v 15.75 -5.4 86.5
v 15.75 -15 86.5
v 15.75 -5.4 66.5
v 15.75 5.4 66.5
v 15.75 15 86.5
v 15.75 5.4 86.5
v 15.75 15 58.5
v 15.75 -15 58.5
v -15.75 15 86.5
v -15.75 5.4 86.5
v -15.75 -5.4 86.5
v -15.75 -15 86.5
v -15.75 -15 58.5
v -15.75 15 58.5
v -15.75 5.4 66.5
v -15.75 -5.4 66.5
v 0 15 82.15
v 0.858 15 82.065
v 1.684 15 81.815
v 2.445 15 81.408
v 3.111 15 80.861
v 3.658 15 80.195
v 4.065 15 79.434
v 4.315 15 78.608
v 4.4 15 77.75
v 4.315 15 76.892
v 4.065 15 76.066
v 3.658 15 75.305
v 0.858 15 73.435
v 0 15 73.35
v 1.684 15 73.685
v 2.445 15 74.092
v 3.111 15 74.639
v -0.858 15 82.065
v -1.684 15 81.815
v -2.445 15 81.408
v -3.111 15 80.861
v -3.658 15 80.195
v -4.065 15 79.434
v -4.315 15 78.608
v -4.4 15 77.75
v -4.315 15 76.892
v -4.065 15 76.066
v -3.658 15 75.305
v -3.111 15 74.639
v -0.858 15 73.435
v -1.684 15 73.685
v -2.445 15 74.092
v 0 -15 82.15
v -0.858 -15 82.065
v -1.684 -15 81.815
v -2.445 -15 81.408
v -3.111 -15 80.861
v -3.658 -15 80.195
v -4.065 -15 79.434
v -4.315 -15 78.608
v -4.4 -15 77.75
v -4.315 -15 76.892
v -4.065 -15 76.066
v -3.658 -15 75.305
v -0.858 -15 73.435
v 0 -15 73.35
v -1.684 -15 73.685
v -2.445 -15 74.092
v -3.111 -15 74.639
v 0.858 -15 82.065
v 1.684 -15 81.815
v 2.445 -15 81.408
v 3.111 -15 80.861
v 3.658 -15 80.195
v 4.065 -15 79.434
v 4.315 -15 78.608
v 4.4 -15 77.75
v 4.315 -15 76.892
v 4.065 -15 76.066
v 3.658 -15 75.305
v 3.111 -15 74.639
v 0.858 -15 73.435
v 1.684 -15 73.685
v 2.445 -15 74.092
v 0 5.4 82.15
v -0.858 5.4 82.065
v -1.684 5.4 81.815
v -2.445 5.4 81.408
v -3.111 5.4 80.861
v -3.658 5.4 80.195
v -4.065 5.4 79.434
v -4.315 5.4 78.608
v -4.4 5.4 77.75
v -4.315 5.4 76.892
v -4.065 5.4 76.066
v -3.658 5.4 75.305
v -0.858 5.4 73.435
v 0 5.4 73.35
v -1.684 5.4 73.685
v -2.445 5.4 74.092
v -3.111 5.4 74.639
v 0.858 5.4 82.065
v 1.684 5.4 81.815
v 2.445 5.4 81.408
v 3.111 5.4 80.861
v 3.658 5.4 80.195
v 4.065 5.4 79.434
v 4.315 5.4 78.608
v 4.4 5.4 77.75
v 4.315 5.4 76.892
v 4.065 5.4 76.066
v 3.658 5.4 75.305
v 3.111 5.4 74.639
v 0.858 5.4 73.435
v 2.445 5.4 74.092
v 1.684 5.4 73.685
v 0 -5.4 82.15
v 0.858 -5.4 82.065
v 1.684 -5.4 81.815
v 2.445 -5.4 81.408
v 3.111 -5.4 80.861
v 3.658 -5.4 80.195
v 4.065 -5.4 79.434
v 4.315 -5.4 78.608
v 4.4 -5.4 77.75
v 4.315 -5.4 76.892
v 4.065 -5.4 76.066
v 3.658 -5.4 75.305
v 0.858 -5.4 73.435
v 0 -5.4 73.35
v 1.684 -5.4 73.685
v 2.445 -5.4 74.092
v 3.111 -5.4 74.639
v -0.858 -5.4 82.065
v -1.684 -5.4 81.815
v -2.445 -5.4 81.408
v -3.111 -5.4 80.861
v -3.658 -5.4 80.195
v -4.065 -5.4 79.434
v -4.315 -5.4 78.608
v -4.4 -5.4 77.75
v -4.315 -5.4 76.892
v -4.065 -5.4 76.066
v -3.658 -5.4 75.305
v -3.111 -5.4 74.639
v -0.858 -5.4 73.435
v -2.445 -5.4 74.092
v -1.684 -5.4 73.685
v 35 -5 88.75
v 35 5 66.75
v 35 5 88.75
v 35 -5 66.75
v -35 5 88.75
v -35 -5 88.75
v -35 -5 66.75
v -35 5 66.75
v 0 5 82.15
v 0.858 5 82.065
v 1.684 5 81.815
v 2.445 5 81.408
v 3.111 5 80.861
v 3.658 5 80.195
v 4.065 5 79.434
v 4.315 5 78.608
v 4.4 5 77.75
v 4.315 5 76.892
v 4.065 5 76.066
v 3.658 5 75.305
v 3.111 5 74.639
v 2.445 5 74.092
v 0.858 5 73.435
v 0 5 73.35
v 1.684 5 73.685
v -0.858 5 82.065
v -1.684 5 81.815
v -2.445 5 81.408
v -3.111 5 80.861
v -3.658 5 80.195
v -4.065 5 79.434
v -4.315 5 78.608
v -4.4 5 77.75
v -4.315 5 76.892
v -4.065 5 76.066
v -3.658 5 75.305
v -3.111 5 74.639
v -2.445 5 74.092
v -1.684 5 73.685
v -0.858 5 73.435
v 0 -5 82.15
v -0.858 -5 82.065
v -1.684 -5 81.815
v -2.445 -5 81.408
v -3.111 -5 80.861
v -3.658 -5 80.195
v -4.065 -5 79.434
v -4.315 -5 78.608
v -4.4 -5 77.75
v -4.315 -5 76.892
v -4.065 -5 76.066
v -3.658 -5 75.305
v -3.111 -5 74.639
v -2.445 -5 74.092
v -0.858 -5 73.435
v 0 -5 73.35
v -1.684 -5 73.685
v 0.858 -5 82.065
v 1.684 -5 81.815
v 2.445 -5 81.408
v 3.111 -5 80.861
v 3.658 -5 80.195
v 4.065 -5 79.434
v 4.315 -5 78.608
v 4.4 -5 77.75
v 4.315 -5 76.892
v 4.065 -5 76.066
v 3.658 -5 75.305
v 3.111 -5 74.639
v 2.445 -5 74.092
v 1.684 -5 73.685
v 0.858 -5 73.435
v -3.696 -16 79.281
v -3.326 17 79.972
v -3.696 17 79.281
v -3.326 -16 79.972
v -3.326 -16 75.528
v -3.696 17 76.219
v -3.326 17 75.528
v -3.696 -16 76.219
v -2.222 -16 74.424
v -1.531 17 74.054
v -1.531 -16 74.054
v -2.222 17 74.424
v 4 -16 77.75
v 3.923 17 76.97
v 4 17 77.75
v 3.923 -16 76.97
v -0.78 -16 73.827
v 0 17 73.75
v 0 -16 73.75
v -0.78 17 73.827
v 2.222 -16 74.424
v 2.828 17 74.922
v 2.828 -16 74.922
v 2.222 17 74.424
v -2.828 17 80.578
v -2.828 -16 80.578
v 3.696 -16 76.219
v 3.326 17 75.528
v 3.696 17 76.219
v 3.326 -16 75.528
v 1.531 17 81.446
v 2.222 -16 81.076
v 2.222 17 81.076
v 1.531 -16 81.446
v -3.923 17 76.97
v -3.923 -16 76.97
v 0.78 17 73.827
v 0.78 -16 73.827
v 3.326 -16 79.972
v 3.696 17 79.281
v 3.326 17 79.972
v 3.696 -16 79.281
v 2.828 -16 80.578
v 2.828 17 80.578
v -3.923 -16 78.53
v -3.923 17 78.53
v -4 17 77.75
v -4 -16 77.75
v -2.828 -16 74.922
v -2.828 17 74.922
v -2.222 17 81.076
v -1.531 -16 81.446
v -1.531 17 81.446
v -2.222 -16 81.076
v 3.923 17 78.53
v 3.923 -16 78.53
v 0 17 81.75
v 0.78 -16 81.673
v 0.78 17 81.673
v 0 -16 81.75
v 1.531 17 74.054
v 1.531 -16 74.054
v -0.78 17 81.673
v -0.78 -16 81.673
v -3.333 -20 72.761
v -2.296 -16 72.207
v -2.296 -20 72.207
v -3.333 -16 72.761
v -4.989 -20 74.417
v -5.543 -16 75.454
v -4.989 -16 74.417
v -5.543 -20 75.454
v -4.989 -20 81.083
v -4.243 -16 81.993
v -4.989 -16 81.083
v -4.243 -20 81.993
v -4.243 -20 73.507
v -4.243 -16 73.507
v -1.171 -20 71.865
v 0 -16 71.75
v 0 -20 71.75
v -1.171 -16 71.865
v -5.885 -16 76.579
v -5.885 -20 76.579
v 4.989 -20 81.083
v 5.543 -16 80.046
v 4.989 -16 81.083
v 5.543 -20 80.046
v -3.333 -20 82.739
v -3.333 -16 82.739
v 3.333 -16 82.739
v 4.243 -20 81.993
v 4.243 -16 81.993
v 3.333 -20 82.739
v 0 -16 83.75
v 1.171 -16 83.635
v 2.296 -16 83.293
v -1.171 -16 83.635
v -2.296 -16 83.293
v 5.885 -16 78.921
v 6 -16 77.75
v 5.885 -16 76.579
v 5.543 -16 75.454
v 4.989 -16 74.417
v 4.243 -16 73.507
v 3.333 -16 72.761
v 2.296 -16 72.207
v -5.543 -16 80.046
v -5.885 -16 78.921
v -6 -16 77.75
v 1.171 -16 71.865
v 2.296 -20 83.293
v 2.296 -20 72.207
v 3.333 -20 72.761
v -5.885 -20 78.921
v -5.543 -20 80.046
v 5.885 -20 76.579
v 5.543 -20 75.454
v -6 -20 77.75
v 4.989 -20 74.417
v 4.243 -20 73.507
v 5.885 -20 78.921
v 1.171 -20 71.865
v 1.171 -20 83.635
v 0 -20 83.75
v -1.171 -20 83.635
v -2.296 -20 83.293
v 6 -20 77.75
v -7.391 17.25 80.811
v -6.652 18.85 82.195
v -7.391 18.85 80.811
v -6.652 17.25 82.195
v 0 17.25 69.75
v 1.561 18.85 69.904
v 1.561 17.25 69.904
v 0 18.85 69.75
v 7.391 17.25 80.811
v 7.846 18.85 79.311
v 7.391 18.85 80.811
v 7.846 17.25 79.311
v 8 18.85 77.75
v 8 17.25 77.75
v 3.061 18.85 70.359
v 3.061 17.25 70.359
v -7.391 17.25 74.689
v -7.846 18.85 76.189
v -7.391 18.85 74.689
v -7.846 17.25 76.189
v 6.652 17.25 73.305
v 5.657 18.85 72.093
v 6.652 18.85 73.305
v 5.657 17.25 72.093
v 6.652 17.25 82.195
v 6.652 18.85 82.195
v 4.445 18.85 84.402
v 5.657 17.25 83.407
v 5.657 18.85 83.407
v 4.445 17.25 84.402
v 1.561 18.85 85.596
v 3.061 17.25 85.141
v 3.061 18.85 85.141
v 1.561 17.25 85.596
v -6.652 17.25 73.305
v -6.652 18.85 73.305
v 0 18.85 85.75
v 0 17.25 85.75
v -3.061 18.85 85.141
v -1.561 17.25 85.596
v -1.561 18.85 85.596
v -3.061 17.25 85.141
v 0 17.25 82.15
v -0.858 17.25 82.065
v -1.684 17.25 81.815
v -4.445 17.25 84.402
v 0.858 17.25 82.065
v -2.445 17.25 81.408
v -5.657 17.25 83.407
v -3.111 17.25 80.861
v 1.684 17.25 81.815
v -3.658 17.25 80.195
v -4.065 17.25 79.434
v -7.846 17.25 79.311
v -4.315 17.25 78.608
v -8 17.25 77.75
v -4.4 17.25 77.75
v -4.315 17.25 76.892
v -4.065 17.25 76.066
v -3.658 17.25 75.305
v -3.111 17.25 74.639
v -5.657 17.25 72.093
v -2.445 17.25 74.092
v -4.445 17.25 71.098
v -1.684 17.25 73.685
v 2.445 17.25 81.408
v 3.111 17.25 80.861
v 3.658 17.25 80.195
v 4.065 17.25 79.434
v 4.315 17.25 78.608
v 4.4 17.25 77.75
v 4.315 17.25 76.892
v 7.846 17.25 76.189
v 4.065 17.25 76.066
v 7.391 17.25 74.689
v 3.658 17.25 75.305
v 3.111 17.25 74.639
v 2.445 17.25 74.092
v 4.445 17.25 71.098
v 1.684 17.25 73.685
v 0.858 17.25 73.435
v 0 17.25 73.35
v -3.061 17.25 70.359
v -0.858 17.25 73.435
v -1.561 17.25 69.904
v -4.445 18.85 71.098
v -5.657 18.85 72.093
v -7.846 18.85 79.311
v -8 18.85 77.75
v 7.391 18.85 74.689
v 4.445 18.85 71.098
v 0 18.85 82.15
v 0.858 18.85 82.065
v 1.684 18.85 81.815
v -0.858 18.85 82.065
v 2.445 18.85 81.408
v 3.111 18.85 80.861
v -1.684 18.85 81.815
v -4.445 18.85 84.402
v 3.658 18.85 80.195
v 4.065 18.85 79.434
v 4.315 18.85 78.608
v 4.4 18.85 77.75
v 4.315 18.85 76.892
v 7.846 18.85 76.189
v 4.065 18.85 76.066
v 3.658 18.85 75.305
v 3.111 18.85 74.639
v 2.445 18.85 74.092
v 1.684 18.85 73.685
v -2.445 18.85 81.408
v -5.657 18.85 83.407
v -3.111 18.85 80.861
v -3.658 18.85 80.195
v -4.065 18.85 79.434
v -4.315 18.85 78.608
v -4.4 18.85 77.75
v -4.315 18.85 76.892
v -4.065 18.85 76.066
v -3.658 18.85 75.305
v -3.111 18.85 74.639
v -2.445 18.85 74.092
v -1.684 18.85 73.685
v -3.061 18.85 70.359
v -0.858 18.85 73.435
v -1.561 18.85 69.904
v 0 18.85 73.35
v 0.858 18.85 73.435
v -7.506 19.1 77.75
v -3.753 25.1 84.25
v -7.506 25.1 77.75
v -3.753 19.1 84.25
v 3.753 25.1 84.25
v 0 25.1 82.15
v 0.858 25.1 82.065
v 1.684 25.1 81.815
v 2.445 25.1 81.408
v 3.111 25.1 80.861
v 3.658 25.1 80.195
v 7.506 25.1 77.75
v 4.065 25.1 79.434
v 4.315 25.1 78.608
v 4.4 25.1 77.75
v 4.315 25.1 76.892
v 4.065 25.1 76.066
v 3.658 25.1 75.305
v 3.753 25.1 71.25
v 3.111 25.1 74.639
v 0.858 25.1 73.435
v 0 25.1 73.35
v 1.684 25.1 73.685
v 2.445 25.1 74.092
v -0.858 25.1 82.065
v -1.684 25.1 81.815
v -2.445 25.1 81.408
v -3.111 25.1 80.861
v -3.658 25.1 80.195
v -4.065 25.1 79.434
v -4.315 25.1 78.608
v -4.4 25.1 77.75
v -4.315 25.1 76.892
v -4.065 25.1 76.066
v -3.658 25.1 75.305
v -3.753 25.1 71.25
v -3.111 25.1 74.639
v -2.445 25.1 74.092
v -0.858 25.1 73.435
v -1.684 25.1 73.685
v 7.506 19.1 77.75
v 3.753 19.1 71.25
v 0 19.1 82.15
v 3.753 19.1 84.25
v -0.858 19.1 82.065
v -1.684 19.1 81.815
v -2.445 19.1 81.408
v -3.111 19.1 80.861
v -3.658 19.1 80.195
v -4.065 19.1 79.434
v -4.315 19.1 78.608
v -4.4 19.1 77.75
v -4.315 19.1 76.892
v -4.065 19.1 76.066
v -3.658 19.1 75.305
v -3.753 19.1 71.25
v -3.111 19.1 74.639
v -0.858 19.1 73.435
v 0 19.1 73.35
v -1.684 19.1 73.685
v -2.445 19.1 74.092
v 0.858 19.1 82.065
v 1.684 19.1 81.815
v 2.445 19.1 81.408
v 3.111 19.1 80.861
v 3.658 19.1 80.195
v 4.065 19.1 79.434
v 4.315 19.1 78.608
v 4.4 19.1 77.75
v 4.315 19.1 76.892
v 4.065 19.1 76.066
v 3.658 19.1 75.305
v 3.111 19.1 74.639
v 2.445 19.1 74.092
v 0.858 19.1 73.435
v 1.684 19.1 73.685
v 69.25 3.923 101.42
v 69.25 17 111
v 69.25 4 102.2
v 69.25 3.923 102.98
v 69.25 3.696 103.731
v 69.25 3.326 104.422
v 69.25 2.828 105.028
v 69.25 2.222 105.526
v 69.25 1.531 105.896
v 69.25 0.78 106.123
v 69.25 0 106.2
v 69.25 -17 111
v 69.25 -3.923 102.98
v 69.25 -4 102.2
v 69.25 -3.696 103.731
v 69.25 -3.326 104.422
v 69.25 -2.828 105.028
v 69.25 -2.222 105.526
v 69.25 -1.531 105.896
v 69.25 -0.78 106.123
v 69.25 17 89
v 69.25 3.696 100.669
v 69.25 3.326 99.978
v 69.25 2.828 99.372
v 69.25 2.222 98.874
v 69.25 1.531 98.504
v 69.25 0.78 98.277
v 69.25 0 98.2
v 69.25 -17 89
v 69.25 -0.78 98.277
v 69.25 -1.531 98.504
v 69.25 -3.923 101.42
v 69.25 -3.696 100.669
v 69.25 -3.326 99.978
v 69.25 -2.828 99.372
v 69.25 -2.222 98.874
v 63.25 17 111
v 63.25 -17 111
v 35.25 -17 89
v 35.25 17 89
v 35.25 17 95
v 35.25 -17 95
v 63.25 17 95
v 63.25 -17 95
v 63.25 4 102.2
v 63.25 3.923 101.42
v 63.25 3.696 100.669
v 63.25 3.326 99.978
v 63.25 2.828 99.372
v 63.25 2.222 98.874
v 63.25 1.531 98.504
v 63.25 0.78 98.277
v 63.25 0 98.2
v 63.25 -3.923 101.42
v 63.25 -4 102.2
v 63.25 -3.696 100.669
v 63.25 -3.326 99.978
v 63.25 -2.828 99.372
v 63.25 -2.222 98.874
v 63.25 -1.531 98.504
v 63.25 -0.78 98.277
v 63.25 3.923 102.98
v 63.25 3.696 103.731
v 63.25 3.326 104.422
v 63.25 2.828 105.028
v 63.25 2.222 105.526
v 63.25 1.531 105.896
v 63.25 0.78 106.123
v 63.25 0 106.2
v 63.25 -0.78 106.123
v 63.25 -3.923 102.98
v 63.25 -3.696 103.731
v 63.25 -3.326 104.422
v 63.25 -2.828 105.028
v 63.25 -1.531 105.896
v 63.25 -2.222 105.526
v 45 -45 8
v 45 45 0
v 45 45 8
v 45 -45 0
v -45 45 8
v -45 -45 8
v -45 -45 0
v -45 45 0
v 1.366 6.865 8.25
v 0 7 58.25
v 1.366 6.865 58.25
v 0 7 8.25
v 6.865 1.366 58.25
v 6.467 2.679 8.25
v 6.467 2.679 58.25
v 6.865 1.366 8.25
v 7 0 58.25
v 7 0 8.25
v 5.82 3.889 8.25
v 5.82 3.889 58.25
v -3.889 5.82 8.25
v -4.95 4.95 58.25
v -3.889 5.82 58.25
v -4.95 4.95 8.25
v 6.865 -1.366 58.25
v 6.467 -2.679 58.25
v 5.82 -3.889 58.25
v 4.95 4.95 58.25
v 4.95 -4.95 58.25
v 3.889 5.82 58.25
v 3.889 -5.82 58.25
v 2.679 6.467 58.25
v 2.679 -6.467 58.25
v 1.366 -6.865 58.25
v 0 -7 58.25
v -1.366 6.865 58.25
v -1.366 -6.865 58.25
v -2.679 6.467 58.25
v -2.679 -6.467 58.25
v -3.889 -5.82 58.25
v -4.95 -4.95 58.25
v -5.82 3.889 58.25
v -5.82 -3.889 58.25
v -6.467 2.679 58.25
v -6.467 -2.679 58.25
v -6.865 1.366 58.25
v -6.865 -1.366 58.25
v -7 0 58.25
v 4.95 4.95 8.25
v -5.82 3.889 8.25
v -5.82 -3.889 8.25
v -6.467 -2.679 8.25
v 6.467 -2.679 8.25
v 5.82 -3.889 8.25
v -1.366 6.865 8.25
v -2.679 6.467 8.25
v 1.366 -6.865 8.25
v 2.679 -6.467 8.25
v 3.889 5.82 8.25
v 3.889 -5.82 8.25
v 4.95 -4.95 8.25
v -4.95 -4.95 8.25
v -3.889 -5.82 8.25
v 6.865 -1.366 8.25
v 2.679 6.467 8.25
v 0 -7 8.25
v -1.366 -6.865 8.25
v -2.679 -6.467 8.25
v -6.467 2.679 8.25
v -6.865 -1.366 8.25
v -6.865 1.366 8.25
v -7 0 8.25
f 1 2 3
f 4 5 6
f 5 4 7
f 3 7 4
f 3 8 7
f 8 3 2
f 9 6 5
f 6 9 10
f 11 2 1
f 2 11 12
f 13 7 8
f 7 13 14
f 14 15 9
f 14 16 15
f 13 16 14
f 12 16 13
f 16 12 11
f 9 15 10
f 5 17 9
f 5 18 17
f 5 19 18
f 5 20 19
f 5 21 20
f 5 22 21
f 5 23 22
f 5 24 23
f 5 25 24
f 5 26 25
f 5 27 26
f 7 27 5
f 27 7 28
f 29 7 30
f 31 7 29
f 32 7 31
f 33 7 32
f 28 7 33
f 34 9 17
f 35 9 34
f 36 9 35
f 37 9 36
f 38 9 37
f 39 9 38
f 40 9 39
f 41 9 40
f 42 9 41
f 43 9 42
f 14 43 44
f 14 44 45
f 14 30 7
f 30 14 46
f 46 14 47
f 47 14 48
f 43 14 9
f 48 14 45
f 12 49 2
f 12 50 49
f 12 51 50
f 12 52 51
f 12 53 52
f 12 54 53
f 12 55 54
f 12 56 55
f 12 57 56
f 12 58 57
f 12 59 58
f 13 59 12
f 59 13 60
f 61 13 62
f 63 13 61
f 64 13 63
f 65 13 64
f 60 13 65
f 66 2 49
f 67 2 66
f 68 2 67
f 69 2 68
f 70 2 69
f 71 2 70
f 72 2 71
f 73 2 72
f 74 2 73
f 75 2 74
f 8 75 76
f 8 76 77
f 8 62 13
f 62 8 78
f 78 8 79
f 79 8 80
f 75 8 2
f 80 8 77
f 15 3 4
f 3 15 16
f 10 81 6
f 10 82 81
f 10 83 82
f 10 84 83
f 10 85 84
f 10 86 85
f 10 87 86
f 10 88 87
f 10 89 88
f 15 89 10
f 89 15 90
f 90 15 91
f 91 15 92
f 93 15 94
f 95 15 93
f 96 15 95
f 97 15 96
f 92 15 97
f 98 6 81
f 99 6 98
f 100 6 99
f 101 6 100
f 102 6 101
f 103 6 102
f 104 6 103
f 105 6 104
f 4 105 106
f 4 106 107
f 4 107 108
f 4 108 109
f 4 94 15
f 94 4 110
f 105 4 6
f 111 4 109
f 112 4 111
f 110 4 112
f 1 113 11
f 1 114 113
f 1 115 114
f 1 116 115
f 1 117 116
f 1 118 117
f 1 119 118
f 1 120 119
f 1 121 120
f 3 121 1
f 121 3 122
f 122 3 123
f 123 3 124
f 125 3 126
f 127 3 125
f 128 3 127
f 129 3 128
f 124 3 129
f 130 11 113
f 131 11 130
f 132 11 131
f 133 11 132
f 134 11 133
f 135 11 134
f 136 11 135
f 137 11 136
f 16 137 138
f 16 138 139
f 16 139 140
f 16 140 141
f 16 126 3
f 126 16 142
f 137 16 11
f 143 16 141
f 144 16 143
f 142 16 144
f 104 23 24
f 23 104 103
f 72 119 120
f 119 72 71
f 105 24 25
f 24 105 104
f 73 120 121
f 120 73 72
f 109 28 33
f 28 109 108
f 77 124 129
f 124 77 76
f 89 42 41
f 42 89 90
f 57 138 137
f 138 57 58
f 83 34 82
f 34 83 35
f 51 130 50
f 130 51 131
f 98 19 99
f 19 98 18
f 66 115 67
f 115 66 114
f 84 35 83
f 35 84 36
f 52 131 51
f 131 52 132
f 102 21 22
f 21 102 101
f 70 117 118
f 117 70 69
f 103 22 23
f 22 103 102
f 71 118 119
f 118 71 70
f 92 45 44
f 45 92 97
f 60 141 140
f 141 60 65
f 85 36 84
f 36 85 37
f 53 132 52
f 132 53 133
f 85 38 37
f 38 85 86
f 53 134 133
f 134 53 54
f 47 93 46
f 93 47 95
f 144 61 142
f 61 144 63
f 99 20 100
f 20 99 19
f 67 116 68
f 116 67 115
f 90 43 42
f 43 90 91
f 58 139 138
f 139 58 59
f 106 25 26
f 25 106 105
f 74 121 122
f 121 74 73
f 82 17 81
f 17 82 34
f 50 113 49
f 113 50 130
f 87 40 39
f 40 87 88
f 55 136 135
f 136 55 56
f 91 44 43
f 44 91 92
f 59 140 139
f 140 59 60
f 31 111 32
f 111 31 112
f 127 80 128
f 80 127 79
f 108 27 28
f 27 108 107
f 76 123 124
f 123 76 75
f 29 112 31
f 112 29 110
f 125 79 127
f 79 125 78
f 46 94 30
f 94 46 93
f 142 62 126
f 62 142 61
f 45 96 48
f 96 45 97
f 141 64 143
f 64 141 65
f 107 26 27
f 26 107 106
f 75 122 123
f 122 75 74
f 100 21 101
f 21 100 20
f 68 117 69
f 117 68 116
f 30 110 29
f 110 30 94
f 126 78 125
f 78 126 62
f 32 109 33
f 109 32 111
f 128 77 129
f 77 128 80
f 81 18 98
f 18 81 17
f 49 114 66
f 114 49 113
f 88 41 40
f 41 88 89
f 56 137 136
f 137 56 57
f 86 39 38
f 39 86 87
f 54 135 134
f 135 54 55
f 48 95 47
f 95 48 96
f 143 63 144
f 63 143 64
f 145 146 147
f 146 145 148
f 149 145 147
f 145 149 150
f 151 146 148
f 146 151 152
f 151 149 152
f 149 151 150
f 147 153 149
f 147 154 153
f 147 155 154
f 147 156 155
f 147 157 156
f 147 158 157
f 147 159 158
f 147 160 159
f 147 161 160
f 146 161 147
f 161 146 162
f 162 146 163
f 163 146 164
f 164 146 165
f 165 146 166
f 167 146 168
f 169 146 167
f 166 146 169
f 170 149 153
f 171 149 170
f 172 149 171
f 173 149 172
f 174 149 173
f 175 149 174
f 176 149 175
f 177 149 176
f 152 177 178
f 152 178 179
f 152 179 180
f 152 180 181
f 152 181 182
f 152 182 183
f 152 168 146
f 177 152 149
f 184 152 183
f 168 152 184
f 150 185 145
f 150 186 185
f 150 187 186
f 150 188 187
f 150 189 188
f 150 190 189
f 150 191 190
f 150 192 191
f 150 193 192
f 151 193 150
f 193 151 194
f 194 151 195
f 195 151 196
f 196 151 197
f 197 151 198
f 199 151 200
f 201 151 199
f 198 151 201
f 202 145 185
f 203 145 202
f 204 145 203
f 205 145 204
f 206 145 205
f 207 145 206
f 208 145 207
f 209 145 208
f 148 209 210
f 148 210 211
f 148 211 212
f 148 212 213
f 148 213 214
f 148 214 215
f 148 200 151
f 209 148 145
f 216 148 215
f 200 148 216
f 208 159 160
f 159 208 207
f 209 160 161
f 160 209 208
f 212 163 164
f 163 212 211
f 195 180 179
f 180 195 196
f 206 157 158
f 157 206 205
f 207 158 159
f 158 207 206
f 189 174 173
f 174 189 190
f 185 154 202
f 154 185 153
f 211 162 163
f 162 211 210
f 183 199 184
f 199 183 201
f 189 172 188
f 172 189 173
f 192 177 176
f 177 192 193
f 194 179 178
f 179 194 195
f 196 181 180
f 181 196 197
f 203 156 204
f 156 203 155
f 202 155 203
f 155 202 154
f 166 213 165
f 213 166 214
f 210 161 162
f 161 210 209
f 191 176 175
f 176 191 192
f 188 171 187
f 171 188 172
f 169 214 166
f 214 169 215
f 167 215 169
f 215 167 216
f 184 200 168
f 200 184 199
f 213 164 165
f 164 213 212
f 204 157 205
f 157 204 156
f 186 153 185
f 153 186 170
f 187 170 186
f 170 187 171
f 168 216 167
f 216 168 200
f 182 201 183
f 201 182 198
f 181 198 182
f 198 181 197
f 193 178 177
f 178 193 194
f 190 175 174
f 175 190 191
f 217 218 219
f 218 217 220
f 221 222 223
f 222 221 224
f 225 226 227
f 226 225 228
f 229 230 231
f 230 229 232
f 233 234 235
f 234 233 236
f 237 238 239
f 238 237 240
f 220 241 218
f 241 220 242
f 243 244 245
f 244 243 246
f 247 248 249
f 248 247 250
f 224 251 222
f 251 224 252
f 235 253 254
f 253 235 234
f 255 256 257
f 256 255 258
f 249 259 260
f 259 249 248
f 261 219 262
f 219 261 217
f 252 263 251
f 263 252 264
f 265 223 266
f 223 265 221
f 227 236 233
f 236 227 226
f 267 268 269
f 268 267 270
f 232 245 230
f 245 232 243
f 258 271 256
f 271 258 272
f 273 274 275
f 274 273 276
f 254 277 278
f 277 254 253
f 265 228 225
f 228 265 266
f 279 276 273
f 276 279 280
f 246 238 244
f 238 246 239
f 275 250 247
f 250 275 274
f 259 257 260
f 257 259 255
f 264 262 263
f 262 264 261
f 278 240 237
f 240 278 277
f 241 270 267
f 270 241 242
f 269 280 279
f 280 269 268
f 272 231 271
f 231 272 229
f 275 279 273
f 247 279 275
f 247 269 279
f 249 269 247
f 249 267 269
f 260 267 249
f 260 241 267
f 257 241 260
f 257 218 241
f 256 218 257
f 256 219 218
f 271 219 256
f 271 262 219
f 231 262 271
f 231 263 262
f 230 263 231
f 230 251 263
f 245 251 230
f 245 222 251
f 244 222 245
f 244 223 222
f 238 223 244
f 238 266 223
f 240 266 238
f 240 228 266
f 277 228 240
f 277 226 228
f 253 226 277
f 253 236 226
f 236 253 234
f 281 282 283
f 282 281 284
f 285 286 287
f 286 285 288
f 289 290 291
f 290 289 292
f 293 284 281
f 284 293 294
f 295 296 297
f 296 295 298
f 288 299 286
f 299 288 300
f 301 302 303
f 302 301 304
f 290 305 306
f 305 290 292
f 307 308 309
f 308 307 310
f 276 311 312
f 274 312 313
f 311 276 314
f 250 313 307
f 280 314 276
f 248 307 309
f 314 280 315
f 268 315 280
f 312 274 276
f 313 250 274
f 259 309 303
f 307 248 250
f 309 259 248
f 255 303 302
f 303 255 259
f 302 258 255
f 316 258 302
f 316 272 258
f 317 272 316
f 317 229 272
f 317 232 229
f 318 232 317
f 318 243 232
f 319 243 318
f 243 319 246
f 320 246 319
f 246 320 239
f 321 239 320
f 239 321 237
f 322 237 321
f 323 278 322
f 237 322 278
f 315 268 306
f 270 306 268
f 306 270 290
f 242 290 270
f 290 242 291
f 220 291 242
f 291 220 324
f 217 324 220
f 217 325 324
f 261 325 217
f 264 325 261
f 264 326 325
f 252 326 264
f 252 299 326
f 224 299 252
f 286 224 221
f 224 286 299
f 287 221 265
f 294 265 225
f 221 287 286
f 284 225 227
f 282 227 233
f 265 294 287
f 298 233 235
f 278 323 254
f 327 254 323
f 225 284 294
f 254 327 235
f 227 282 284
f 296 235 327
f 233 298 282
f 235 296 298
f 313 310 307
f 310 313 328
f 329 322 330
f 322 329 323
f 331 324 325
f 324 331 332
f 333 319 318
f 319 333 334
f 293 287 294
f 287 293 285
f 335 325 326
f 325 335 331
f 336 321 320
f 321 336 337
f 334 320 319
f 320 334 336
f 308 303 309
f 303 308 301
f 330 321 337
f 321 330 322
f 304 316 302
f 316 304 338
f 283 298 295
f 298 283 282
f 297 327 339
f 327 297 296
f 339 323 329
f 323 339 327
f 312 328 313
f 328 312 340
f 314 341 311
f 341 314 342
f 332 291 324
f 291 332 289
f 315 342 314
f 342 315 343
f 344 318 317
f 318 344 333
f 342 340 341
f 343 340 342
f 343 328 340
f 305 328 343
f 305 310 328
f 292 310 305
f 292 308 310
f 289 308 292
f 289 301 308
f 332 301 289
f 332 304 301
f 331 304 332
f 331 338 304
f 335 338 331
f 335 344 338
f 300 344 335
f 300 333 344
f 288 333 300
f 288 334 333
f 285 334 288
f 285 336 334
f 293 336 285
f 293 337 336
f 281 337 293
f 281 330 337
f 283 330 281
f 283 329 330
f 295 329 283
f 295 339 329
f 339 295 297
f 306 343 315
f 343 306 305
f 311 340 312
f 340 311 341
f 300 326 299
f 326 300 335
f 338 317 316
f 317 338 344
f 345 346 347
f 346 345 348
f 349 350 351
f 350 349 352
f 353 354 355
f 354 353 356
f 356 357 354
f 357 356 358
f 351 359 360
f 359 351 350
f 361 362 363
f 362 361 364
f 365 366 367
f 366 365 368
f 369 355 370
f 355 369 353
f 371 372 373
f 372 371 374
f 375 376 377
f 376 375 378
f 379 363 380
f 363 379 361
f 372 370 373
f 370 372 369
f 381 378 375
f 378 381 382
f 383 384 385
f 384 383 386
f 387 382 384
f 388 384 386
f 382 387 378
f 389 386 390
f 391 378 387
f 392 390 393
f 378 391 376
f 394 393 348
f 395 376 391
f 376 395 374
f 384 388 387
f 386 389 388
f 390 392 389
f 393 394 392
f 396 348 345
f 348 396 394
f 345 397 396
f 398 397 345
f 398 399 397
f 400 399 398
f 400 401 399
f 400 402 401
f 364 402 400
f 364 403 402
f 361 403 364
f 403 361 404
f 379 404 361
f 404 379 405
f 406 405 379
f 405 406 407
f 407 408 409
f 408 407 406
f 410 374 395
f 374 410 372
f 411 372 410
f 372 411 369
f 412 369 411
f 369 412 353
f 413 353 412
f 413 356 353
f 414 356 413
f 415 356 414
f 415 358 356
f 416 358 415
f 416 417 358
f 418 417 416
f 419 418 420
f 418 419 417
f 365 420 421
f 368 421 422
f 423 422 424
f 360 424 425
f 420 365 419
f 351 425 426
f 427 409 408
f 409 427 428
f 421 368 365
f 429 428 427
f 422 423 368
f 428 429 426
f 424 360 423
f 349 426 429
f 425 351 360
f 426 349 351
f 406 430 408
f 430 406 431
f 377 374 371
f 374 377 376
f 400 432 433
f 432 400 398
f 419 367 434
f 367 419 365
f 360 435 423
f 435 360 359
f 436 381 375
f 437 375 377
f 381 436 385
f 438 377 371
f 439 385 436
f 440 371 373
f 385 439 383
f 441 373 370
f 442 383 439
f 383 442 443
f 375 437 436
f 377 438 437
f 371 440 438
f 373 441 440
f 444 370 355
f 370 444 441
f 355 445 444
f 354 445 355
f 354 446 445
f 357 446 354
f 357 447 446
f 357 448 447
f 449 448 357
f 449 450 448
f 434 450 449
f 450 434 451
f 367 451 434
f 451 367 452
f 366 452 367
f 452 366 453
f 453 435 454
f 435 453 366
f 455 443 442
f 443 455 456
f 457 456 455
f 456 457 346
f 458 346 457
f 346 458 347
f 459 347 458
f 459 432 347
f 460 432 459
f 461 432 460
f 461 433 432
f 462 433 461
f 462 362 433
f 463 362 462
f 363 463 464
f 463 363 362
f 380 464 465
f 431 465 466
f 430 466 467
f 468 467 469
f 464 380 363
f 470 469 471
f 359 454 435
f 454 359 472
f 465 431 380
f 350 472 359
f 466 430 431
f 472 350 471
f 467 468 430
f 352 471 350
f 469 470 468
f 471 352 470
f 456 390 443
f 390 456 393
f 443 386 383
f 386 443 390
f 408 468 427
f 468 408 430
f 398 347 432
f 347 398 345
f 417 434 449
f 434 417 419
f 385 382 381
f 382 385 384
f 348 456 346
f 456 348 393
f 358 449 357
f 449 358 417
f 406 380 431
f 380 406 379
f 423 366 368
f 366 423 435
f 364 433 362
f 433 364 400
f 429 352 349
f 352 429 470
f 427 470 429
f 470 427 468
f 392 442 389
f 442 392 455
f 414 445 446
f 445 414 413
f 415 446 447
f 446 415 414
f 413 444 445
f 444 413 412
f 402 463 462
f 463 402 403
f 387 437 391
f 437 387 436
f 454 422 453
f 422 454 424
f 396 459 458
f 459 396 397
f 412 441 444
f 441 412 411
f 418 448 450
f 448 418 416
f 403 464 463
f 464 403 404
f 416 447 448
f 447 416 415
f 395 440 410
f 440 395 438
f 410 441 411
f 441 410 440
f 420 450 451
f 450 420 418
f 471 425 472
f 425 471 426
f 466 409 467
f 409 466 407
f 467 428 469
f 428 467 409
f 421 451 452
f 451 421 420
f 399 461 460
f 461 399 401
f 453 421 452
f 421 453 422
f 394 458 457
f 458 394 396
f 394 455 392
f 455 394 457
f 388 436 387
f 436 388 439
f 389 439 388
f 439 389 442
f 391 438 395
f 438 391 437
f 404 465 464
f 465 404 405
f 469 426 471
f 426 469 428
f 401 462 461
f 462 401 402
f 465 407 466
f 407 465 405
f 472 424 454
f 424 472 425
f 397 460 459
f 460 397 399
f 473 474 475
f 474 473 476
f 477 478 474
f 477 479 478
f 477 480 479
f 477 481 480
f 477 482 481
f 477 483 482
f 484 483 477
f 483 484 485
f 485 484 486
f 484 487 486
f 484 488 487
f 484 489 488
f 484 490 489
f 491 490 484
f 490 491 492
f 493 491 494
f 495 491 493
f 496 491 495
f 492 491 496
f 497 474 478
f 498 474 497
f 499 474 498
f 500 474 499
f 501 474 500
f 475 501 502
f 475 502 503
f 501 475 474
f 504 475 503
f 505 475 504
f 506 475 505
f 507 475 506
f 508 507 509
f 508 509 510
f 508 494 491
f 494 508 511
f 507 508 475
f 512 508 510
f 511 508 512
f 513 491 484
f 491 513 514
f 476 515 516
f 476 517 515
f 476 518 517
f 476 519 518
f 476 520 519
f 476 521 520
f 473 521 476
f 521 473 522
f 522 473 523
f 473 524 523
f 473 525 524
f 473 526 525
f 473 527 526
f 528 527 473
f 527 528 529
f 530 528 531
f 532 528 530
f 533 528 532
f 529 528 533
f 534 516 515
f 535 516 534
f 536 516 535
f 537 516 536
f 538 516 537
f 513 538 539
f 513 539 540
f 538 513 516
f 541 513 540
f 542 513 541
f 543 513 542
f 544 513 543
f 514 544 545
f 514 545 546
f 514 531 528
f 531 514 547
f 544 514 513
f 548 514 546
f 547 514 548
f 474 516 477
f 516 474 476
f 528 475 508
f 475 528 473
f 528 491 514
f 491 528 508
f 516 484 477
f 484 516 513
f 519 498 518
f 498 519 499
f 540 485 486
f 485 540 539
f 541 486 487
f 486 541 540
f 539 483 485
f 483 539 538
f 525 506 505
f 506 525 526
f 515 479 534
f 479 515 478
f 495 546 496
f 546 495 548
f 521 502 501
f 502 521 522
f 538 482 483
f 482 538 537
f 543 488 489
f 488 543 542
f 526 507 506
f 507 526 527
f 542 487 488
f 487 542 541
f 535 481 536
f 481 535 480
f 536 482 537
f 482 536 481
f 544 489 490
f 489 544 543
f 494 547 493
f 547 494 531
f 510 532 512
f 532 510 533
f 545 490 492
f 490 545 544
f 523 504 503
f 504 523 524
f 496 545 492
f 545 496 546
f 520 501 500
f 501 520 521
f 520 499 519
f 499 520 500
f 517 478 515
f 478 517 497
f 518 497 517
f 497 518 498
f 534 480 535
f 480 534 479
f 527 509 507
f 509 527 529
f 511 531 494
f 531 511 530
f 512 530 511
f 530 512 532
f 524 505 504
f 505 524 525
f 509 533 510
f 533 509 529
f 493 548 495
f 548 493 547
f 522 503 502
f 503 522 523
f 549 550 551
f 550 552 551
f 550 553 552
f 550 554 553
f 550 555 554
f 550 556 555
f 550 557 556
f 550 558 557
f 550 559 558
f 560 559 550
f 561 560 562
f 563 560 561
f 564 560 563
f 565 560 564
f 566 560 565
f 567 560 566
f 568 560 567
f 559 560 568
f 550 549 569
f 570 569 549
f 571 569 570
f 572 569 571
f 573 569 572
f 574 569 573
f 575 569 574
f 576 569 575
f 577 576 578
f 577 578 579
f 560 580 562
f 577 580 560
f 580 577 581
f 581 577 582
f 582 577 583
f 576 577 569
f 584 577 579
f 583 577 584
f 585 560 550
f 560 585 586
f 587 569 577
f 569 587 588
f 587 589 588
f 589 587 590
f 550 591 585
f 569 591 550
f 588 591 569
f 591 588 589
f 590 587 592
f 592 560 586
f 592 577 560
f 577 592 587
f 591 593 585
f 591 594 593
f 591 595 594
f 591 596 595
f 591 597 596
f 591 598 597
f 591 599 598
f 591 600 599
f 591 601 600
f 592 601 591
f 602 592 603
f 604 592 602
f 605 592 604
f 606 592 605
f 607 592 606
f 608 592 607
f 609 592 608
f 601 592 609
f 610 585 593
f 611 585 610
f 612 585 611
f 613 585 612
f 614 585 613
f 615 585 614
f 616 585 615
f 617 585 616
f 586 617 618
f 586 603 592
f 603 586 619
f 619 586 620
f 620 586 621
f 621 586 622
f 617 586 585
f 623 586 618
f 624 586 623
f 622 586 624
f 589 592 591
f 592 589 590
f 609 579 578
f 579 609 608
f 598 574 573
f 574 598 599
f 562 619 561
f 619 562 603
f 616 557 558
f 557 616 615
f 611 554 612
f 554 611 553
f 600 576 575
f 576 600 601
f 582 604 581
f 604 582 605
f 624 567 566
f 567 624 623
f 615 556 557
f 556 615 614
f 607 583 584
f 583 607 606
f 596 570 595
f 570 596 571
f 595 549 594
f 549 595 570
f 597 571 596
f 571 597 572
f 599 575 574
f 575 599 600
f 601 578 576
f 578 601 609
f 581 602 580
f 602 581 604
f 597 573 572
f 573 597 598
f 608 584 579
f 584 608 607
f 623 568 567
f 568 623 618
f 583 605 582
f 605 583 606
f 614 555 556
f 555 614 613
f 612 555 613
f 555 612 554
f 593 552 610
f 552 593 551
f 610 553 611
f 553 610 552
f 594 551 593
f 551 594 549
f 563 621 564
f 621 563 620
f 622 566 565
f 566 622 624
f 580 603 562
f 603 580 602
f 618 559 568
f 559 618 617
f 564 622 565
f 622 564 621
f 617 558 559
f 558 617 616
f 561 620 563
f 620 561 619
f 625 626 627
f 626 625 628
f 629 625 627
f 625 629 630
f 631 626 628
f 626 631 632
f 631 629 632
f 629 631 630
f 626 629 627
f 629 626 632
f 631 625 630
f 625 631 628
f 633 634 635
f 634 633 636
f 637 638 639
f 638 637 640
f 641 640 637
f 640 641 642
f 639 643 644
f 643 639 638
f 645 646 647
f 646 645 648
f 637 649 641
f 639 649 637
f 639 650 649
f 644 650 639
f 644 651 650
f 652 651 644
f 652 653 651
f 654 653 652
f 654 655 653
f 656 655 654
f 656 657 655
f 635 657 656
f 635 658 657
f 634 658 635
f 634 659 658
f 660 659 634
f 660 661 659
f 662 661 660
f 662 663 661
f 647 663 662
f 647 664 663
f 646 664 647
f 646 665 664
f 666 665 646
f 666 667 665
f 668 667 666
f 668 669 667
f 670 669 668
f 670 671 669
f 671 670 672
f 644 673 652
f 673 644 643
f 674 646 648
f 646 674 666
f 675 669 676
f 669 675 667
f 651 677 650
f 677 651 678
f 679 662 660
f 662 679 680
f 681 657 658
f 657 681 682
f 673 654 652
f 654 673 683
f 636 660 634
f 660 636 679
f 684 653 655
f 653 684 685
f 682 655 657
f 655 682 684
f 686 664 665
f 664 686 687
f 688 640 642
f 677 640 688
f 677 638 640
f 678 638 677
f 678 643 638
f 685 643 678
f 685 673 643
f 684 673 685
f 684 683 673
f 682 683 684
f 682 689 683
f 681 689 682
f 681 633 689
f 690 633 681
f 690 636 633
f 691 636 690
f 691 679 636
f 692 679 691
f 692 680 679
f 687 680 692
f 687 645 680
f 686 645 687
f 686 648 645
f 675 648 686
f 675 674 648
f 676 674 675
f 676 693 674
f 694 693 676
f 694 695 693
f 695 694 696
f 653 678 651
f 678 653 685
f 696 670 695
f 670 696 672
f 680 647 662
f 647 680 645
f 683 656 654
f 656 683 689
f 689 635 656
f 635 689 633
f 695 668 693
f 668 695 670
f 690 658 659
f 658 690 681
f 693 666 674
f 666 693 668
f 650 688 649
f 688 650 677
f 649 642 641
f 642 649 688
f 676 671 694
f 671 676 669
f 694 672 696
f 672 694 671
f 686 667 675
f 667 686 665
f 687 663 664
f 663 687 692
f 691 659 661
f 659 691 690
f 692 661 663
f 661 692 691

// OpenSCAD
$fn = 32;

// ------------------------------------------------------------------------
// Lamp arm: column d14 x 50 mm, arm 70 mm
// Every part is its own module, assembly() places every instance.
// ------------------------------------------------------------------------

// --- part 1 ---
module lamp_base() {
  difference() {
    translate([-45, -45, 0]) cube([90, 90, 8]);
  }
}

// --- part 2 ---
module lamp_column() {
  cylinder(h = 50, d = 14);
}

// --- part 3 ---
module head_fork() {
  difference() {
    translate([-15.75, -15, 0]) cube([31.5, 30, 28]);
    translate([-16.75, -5.4, 8]) cube([33.5, 10.8, 21]);
    translate([0, 0, 19.25]) rotate([90, 0, 0]) cylinder(h = 32, d = 8.8, center = true);
  }
}

// --- part 4 ---
module lamp_arm() {
  difference() {
    translate([-35, -5, 0]) cube([70, 10, 22]);
    translate([0, 0, 11]) rotate([90, 0, 0]) cylinder(h = 12, d = 8.8, center = true);
  }
}

// --- part 5 ---
module arm_pin() {
  rotate([0, 90, 0]) cylinder(h = 34, d = 8, center = true);
  translate([-20, 0, 0]) rotate([0, 90, 0]) cylinder(h = 4, d = 12);
}

// --- part 6 ---
module arm_washer() {
  difference() {
      translate([0, 0, 0]) cylinder(h = 1.6, d = 16);
      translate([0, 0, -1]) cylinder(h = 3.6, d = 8.8);
    }
}

// --- part 7 ---
module arm_nut() {
  difference() {
    linear_extrude(height = 6) polygon(points = [[7.506, 0], [3.753, 6.5], [-3.753, 6.5], [-7.506, 0], [-3.753, -6.5], [3.753, -6.5]]);
    translate([0, 0, -1]) cylinder(h = 8, d = 8.8);
  }
}

// --- part 8 ---
module shade_bracket() {
  difference() {
    translate([-17, -17, 0]) cube([34, 34, 22]);
    translate([-18, -18, 6]) cube([29, 36, 17]);
    translate([14, 0, 13.2]) rotate([0, 90, 0]) cylinder(h = 8, d = 8, center = true);
  }
}

// --- assembly ---
module assembly() {
  color([0.80, 0.24, 0.20]) translate([0, 0, 0]) rotate([0, 0, 0]) lamp_base();
  color([0.20, 0.45, 0.75]) translate([0, 0, 8.25]) rotate([0, 0, 0]) lamp_column();
  color([0.25, 0.62, 0.32]) translate([0, 0, 58.5]) rotate([0, 0, 0]) head_fork();
  color([0.92, 0.70, 0.18]) translate([0, 0, 66.75]) rotate([0, 0, 0]) lamp_arm();
  color([0.58, 0.35, 0.70]) translate([0, 0, 77.75]) rotate([0, 0, 90]) arm_pin();
  color([0.16, 0.66, 0.66]) translate([0, 18.85, 77.75]) rotate([90, 0, 0]) arm_washer();
  color([0.85, 0.48, 0.18]) translate([0, 25.1, 77.75]) rotate([90, 0, 0]) arm_nut();
  color([0.55, 0.60, 0.65]) translate([52.25, 0, 89]) rotate([0, 0, 0]) shade_bracket();
}

assembly();
